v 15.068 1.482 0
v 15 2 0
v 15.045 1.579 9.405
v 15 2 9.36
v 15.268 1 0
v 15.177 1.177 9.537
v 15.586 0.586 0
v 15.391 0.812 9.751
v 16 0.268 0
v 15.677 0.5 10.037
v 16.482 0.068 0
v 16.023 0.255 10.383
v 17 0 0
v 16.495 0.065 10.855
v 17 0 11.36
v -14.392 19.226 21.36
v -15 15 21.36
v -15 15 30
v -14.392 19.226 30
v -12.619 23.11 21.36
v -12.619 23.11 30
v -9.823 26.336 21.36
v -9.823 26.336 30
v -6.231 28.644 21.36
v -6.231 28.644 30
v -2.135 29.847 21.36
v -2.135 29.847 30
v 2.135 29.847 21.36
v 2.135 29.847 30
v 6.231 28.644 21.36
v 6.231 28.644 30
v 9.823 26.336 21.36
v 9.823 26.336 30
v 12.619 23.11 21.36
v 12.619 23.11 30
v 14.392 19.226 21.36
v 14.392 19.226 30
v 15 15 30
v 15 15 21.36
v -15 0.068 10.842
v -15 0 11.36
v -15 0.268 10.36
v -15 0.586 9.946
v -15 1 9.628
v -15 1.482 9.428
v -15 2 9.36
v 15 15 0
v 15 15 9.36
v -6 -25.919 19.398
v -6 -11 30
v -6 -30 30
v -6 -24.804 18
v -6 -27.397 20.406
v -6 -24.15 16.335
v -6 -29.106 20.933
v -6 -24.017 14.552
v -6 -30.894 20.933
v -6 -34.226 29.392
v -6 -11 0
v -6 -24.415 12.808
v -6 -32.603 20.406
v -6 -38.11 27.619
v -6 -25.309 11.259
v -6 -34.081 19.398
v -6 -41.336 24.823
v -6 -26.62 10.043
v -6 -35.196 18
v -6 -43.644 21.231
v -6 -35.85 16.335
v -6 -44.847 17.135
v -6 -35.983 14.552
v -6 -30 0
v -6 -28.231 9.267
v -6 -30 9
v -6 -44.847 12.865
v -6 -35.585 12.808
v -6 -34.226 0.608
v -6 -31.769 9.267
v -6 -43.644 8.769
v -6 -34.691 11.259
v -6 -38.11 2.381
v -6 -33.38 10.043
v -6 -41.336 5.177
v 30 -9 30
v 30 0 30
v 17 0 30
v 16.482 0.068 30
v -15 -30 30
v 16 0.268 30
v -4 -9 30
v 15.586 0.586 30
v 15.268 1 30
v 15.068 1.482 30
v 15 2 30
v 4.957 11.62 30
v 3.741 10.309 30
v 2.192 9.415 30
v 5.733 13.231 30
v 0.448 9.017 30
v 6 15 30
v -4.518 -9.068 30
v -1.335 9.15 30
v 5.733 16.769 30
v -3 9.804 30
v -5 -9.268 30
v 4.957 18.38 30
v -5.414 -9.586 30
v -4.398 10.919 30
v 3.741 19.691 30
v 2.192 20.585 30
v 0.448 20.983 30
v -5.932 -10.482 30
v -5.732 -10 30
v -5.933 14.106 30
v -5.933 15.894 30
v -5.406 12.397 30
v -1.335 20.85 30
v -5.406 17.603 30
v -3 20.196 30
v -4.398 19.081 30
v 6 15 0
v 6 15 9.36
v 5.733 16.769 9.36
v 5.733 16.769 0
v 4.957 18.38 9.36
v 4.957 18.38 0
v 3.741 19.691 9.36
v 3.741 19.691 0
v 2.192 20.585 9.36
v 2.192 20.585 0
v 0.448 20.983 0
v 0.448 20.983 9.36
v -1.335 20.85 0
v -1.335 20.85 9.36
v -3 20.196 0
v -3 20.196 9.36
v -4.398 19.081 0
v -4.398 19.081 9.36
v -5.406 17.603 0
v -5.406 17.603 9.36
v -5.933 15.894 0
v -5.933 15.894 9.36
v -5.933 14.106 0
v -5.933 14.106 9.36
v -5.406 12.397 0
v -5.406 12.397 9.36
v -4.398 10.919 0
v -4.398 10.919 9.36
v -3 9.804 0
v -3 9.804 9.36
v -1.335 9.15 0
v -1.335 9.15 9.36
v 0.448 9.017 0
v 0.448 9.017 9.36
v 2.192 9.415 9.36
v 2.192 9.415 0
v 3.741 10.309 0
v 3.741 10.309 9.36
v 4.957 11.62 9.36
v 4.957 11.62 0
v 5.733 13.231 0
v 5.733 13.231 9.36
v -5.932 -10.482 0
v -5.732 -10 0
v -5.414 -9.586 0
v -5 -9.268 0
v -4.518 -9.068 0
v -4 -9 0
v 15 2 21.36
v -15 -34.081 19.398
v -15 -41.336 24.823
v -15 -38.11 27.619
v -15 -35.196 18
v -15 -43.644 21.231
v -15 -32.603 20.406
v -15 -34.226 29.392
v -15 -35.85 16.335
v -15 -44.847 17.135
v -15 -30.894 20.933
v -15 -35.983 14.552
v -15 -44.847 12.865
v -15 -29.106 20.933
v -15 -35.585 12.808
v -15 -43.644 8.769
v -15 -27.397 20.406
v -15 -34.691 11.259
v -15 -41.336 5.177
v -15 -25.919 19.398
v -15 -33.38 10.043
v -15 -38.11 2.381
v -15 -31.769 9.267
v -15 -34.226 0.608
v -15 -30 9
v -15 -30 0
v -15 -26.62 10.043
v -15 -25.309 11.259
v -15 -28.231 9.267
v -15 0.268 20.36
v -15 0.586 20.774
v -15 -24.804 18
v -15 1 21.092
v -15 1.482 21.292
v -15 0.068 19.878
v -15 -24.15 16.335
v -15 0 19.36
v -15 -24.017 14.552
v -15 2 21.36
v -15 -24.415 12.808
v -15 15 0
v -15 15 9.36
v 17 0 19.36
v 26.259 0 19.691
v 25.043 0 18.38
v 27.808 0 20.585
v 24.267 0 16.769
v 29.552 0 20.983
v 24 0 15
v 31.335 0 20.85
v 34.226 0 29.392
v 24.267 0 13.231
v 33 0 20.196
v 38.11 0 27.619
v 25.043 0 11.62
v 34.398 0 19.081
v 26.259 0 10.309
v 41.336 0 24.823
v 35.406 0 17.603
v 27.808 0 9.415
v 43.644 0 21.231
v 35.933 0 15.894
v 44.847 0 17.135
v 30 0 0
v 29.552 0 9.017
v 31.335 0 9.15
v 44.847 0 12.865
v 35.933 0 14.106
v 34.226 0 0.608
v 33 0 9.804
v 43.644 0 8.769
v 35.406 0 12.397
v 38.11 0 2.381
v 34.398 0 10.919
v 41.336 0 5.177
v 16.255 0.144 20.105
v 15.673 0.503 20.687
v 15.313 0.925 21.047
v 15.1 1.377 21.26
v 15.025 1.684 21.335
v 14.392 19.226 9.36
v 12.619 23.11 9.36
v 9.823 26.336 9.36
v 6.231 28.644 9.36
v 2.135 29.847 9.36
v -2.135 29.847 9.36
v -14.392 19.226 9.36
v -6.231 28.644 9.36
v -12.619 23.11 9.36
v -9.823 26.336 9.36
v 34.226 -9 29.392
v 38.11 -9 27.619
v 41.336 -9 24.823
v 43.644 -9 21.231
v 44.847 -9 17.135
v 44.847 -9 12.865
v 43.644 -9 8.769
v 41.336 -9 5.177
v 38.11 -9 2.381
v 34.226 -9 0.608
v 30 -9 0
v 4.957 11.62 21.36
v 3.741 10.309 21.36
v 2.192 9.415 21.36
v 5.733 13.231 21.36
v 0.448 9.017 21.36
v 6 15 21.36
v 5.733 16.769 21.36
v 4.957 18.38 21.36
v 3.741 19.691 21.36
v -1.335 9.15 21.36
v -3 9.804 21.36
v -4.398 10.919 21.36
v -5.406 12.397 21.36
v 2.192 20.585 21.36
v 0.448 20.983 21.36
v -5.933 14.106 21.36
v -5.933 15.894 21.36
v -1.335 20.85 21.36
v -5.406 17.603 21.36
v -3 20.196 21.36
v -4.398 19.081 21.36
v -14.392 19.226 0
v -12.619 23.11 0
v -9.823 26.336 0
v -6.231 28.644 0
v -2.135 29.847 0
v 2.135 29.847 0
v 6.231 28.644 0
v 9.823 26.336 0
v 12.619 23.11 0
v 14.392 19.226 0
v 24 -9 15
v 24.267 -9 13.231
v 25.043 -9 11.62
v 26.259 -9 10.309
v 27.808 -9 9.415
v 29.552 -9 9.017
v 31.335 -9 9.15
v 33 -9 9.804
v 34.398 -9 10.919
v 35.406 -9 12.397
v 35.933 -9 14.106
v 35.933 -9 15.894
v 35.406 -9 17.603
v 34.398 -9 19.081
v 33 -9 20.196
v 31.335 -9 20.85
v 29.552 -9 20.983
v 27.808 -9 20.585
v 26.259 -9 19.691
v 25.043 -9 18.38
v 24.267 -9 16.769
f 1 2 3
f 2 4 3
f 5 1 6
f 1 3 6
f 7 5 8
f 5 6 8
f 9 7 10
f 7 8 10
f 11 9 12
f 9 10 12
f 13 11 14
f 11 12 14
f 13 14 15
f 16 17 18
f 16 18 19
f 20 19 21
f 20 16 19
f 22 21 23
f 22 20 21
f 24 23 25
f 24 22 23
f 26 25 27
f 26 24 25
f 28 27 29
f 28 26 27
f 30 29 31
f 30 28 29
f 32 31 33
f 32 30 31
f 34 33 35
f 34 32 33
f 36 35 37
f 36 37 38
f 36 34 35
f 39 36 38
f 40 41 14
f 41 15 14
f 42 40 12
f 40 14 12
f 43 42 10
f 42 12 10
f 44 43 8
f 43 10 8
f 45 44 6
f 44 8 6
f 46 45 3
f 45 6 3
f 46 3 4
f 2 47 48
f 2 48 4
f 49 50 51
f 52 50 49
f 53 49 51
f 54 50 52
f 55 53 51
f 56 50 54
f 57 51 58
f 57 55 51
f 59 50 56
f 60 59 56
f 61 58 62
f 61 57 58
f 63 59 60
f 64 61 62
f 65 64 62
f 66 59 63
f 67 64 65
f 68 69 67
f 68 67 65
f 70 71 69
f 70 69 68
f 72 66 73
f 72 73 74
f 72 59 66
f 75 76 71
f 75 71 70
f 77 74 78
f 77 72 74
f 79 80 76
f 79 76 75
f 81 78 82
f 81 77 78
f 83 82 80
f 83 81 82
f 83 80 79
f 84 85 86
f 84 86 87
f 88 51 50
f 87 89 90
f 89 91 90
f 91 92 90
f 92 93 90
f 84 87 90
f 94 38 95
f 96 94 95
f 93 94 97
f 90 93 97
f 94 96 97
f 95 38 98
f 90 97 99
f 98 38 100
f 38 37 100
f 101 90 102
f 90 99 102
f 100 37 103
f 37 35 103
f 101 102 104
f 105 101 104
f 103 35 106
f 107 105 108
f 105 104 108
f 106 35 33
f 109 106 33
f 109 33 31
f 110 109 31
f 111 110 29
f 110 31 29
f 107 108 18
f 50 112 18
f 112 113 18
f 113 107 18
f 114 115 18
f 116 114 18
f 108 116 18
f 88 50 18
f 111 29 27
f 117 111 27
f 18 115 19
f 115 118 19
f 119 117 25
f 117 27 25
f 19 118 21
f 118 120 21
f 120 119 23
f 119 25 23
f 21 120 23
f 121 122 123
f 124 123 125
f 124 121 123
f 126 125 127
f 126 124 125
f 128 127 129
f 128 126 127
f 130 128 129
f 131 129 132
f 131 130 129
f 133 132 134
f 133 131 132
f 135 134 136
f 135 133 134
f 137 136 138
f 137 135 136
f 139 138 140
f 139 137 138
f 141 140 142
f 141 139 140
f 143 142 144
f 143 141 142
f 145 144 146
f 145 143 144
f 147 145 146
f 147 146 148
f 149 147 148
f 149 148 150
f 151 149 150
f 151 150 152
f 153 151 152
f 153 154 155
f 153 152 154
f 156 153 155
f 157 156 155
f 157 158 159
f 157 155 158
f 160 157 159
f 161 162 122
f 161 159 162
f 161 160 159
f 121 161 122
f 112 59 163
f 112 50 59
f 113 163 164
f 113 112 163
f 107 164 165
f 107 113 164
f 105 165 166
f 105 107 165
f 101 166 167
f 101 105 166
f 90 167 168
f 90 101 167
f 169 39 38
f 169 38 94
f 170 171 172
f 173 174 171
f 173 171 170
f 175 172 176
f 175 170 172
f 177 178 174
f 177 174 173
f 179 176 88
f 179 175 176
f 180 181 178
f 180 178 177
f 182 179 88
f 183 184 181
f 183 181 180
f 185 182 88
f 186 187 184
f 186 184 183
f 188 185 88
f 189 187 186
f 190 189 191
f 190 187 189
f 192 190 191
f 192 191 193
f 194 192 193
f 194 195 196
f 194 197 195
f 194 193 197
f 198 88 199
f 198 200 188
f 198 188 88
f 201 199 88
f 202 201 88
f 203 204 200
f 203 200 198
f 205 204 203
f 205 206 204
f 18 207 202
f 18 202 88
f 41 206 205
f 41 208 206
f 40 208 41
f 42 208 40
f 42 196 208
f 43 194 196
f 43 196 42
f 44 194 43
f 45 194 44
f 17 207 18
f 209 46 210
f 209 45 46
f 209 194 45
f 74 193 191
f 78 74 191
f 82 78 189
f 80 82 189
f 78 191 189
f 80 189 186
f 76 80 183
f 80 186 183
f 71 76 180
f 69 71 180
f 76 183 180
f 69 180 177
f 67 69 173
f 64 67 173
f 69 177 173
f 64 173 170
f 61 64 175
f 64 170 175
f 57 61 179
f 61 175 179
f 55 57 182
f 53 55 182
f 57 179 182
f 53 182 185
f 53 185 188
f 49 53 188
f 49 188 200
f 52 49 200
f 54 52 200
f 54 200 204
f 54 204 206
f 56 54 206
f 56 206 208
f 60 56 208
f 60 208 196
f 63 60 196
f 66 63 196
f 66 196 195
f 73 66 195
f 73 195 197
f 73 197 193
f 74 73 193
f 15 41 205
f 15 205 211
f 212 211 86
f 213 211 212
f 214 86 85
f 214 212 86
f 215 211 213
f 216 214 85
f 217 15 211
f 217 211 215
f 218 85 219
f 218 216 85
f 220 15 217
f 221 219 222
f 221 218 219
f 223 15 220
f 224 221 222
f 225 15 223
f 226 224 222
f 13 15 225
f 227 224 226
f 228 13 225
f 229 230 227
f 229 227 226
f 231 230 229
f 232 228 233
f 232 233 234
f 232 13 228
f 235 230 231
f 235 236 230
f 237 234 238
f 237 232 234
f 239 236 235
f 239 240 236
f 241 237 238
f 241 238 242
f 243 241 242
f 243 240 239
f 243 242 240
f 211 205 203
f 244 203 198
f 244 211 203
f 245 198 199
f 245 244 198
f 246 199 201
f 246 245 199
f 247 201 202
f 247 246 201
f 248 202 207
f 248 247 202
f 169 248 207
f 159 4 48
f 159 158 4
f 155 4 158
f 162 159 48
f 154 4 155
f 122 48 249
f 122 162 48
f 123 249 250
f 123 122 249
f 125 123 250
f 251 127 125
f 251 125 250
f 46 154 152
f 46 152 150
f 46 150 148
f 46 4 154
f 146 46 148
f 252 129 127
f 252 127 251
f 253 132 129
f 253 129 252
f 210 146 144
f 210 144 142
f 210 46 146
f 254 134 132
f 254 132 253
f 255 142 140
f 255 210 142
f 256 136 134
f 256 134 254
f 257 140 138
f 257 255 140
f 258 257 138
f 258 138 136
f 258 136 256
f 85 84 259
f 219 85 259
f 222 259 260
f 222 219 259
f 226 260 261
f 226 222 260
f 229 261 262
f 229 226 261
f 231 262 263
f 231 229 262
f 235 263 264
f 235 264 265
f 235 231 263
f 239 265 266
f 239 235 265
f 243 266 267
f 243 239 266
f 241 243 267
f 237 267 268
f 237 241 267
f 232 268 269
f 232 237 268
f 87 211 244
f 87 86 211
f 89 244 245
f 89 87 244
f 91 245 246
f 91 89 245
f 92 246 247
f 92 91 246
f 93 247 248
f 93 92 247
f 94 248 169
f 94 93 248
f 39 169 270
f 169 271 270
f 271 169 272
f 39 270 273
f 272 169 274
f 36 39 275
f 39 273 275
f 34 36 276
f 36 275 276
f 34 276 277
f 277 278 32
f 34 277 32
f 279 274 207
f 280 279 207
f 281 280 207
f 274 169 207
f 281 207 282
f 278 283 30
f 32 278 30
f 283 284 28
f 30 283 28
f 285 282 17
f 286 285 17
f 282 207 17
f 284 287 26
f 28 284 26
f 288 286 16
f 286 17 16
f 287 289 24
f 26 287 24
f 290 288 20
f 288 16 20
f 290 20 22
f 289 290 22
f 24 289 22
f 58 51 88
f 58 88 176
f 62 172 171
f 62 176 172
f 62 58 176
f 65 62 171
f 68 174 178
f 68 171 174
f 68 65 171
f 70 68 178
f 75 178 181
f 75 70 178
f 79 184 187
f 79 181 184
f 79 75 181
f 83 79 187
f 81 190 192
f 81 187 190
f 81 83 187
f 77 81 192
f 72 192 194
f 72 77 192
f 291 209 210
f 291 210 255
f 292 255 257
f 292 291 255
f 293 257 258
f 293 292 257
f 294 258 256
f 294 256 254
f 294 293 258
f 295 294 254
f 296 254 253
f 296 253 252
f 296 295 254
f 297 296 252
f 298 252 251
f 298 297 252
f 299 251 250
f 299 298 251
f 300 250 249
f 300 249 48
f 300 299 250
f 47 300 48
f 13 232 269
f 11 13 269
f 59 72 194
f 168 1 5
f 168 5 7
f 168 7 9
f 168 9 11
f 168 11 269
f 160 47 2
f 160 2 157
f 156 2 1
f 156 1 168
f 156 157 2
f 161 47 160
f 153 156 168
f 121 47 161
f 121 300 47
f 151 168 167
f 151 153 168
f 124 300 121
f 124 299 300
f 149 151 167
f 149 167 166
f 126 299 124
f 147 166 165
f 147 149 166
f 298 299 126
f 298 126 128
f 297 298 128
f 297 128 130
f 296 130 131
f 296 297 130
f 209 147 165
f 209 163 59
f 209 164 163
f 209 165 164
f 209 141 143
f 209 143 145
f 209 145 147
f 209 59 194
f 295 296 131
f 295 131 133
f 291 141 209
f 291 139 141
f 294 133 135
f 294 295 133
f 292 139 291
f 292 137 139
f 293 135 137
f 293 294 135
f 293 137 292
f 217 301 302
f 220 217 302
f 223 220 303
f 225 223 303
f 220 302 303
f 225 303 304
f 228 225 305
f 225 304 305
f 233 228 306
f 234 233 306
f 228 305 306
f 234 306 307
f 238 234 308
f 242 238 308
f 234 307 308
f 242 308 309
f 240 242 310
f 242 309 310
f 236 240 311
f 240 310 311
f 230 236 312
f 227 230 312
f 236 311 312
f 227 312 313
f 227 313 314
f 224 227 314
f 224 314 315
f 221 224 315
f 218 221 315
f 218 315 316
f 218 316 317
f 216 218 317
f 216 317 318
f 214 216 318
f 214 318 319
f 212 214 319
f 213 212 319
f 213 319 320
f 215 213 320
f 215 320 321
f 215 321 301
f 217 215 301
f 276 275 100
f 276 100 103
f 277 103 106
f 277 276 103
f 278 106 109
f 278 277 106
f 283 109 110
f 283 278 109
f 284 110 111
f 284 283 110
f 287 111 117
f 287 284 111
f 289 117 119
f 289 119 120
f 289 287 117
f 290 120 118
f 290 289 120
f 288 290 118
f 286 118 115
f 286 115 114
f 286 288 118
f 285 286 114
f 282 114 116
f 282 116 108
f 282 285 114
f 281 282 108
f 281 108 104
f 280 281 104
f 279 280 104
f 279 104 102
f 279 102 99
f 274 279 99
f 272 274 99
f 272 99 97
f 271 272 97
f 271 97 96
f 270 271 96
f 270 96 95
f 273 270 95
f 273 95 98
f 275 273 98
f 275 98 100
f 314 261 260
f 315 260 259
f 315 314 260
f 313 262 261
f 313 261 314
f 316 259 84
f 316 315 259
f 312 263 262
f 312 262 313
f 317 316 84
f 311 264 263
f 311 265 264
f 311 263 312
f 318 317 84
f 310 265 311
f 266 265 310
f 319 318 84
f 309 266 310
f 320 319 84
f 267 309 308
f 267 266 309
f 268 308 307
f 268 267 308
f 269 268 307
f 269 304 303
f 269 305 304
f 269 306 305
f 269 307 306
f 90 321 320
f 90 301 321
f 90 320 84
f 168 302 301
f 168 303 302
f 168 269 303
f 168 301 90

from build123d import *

# Parameters (mm, degrees)
SKETCH1_R                            = 6
BOSS_EXTRUDE1_DEPTH                  = 30
FILLET2_RADIUS                       = 15
FILLET2_LENGTH                       = 9
FILLET3_RADIUS                       = 15
FILLET3_LENGTH                       = 9
CUT_EXTRUDE1_DEPTH                   = 10
CUT_EXTRUDE1_DEPTH_BACK              = 59
SKETCH2_W                            = 12
SKETCH2_H                            = 40.970774173
F_12_0MM_DOWEL_HOLE1_D               = 12
F_12_0MM_DOWEL_HOLE1_DEPTH           = 10
F_12_0MM_DOWEL_HOLE1_TIP             = 3.605163714
F_12_0MM_DOWEL_HOLE1_ON_FACE_2_D     = 12
F_12_0MM_DOWEL_HOLE1_ON_FACE_2_DEPTH = 10
F_12_0MM_DOWEL_HOLE1_ON_FACE_2_TIP   = 3.605163714
FILLET4_R                            = 2


with BuildPart() as part:
    # Sketch1 → Boss-Extrude1 (new body)
    with BuildSketch(Plane.XY):
        with BuildLine():
            Line((15, 15), (15, 0))
            Line((15, 0), (45, 0))
            Line((45, 0), (45, -9))
            Line((45, -9), (7.15528467, -9))
            Line((7.15528467, -9), (-6, -9))
            Line((-6, -9), (-6, -45))
            Line((-6, -45), (-15, -45))
            Line((-15, -45), (-15, 15))
            ThreePointArc((-15, 15), (0, 30), (15, 15))
        make_face()
        with Locations((0, 15)):
            Circle(SKETCH1_R, mode=Mode.SUBTRACT)
    extrude(amount=BOSS_EXTRUDE1_DEPTH)

    # Fillet2: full round fillet: the end face becomes a half cylinder, R = half its width
    fillet2_face = Plane((45, -4.5, 15), x_dir=(0, 1, 0), z_dir=(1, 0, 0))  # on the end face: x along it, z out of the body
    fillet2_slab = fillet2_face.offset(-FILLET2_RADIUS / 2) * Box(FILLET2_LENGTH, 2 * FILLET2_RADIUS, FILLET2_RADIUS, mode=Mode.PRIVATE)  # the body's end, R deep
    fillet2_round = Plane((30, -4.5, 15), x_dir=(1, 0, 0), z_dir=(0, 1, 0)) * Cylinder(FILLET2_RADIUS, FILLET2_LENGTH, mode=Mode.PRIVATE)  # its axis R under the face
    add(fillet2_slab - fillet2_round, mode=Mode.SUBTRACT)

    # Fillet3: full round fillet: the end face becomes a half cylinder, R = half its width
    fillet3_face = Plane((-10.5, -45, 15), x_dir=(1, 0, 0), z_dir=(0, -1, 0))  # on the end face: x along it, z out of the body
    fillet3_slab = fillet3_face.offset(-FILLET3_RADIUS / 2) * Box(FILLET3_LENGTH, 2 * FILLET3_RADIUS, FILLET3_RADIUS, mode=Mode.PRIVATE)  # the body's end, R deep
    fillet3_round = Plane((-10.5, -30, 15), x_dir=(0, -1, 0), z_dir=(1, 0, 0)) * Cylinder(FILLET3_RADIUS, FILLET3_LENGTH, mode=Mode.PRIVATE)  # its axis R under the face
    add(fillet3_slab - fillet3_round, mode=Mode.SUBTRACT)

    # Sketch2 → Cut-Extrude1 (cut, two sides: drawn at the far end of the back side and taken through both)
    with BuildSketch(Plane(origin=(15, 0, 0), x_dir=(0, 0, -1), z_dir=(1, 0, 0)).offset(-CUT_EXTRUDE1_DEPTH_BACK)):
        with Locations((-15.359950539, 20.485387087)):
            Rectangle(SKETCH2_W, SKETCH2_H)
    extrude(amount=CUT_EXTRUDE1_DEPTH + CUT_EXTRUDE1_DEPTH_BACK, mode=Mode.SUBTRACT)

    # Ø12.0mm Dowel Hole1
    with Locations(Plane(origin=(30, 0, 15), x_dir=(1, 0, 0), z_dir=(0, 1, 0))):
        with Locations((0, 0)):
            Hole(F_12_0MM_DOWEL_HOLE1_D / 2, depth=F_12_0MM_DOWEL_HOLE1_DEPTH)
            with Locations((0, 0, -(F_12_0MM_DOWEL_HOLE1_DEPTH + F_12_0MM_DOWEL_HOLE1_TIP / 2))):  # 118° drill point
                Cone(0, F_12_0MM_DOWEL_HOLE1_D / 2, F_12_0MM_DOWEL_HOLE1_TIP, mode=Mode.SUBTRACT)

    # Ø12.0mm Dowel Hole1 on face 2
    with Locations(Plane(origin=(-6, -30, 15), x_dir=(0, 0, 1), z_dir=(1, 0, 0))):
        with Locations((0, 0)):
            Hole(F_12_0MM_DOWEL_HOLE1_ON_FACE_2_D / 2, depth=F_12_0MM_DOWEL_HOLE1_ON_FACE_2_DEPTH)
            with Locations((0, 0, -(F_12_0MM_DOWEL_HOLE1_ON_FACE_2_DEPTH + F_12_0MM_DOWEL_HOLE1_ON_FACE_2_TIP / 2))):  # 118° drill point
                Cone(0, F_12_0MM_DOWEL_HOLE1_ON_FACE_2_D / 2, F_12_0MM_DOWEL_HOLE1_ON_FACE_2_TIP, mode=Mode.SUBTRACT)

    # Fillet4
    fillet4_edges = [part.edges().sort_by_distance(p)[0] for p in [
        (15, 0, 25.67997527),
        (-6, -9, 15),
        (15, 0, 4.67997527),
        (0, 0, 21.359950539),
        (0, 0, 9.359950539),
    ]]
    fillet(fillet4_edges, radius=FILLET4_R)


solid = part.part
